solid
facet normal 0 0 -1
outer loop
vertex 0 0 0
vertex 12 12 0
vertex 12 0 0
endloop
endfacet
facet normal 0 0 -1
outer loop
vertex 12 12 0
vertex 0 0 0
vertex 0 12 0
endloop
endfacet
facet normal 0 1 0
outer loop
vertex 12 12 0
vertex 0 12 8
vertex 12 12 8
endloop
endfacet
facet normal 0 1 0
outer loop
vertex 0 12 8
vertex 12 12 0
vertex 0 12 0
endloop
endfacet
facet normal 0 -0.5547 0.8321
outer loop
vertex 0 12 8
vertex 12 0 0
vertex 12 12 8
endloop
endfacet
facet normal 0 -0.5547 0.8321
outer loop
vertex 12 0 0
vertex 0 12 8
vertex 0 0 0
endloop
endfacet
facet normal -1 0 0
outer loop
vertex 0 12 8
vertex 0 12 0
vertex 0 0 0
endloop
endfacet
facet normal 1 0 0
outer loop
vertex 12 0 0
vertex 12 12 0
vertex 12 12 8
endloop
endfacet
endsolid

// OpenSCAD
module prism(l, w, h){
       polyhedron(
               points=[[0,0,0], [l,0,0], [l,w,0], [0,w,0], [0,w,h], [l,w,h]],
               faces=[[0,1,2,3],[5,4,3,2],[0,4,5,1],[0,3,4],[5,2,1]]
               );
       
       // preview unfolded (do not include in your function
       z = 0.08;
       separation = 2;
       border = .2;
       //translate([0,w+separation,0])
       //    cube([l,w,z]);
       //translate([0,w+separation+w+border,0])
       //    cube([l,h,z]);
       //translate([0,w+separation+w+border+h+border,0])
       //    cube([l,sqrt(w*w+h*h),z]);
       //translate([l+border,w+separation+w+border+h+border,0])
       //    polyhedron(
       //            points=[[0,0,0],[h,0,0],[0,sqrt(w*w+h*h),0], [0,0,z],[h,0,z],[0,sqrt(w*w+h*h),z]],
       //            faces=[[0,1,2], [3,5,4], [0,3,4,1], [1,4,5,2], [2,5,3,0]]
       //            );
       //translate([0-border,w+separation+w+border+h+border,0])
       //    polyhedron(
       //            points=[[0,0,0],[0-h,0,0],[0,sqrt(w*w+h*h),0], [0,0,z],[0-h,0,z],[0,sqrt(w*w+h*h),z]],
       //            faces=[[1,0,2],[5,3,4],[0,1,4,3],[1,2,5,4],[2,0,3,5]]
       //            );
       }
   
   prism(12, 12, 8);
